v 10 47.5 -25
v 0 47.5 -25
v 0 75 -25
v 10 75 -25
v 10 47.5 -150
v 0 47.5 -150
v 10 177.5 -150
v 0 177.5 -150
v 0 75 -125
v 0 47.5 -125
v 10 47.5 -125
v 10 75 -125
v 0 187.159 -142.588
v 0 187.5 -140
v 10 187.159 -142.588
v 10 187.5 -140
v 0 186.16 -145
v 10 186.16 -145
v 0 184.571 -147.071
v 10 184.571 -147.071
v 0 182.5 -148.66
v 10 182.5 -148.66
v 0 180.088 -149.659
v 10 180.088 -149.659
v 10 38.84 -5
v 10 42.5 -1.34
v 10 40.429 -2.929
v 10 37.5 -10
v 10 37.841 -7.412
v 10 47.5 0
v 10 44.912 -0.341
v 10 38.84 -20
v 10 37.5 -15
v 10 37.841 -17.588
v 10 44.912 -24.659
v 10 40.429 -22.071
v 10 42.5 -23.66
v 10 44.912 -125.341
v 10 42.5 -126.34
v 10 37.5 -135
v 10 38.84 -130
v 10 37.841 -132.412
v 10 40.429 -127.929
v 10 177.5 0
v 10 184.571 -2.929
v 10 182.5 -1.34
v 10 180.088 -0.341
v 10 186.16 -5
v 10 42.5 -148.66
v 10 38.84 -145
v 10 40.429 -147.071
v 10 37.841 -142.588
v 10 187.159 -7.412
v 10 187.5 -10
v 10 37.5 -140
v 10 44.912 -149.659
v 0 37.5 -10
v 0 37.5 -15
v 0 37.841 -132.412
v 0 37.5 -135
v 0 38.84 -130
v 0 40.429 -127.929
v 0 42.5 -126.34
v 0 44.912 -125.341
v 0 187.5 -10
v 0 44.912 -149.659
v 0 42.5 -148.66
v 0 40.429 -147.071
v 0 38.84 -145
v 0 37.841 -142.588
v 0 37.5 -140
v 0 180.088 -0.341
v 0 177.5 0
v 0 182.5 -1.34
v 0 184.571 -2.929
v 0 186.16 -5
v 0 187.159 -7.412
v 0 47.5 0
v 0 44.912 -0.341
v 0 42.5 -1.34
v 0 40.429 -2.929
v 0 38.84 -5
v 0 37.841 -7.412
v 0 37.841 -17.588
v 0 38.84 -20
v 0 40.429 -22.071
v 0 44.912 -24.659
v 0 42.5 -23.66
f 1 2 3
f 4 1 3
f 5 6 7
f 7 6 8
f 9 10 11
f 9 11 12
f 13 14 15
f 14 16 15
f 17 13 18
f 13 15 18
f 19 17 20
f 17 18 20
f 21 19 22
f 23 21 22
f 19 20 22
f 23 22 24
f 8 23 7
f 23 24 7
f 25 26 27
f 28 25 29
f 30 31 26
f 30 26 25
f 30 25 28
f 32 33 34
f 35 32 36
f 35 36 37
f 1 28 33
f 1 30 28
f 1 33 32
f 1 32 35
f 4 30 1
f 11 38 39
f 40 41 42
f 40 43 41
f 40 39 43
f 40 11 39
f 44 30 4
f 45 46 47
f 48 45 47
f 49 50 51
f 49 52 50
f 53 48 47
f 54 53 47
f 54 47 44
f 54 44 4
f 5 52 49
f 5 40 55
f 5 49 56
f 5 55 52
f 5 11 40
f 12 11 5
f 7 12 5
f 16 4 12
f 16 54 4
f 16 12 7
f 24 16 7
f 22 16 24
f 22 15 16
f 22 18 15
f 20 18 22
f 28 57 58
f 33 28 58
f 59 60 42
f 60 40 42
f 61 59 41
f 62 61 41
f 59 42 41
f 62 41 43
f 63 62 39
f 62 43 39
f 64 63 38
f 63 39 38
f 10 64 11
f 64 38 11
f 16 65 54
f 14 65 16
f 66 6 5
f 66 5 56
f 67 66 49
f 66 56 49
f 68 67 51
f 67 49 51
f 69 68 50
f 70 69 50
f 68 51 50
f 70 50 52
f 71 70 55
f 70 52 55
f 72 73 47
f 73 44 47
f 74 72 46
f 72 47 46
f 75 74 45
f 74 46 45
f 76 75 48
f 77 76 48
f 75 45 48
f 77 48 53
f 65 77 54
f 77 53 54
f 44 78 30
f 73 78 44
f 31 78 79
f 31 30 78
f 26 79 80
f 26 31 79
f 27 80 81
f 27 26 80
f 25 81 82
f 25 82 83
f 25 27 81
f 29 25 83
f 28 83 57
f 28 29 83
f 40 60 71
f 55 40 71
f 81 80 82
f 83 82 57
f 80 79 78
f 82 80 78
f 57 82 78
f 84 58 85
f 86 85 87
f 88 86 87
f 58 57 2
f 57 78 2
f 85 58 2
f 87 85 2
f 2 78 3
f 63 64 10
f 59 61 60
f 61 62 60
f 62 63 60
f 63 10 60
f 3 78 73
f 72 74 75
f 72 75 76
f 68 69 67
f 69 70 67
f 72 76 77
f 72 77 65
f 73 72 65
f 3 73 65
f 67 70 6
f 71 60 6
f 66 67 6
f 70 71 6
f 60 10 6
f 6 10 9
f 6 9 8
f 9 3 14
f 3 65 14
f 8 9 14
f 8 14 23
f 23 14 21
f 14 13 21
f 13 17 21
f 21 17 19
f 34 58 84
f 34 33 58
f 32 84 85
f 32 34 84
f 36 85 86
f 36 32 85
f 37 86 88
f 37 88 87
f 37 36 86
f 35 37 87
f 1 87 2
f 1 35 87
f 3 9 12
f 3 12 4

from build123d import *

# Parameters (mm, degrees)
SKETCH10_W          = 150
SKETCH10_H          = 150
BOSS_EXTRUDE3_DEPTH = 10
SKETCH12_W          = 100
SKETCH12_H          = 37.5
CUT_EXTRUDE2_DEPTH  = 10
FILLET7_R           = 10


with BuildPart() as part:
    # Sketch10 → Boss-Extrude3 (new body)
    with BuildSketch(Plane(origin=(0, 0, 0), x_dir=(0, 0, -1), z_dir=(1, 0, 0))):
        with Locations((75, 112.5)):
            Rectangle(SKETCH10_W, SKETCH10_H)
    extrude(amount=BOSS_EXTRUDE3_DEPTH)

    # Sketch12 → Cut-Extrude2 (cut)
    with BuildSketch(Plane.ZY):
        with Locations((-75, 56.25)):
            Rectangle(SKETCH12_W, SKETCH12_H)
    extrude(amount=-CUT_EXTRUDE2_DEPTH, mode=Mode.SUBTRACT)

    # Fillet7
    fillet7_edges = [part.edges().sort_by_distance(p)[0] for p in [
        (5, 37.5, -125),
        (5, 37.5, -25),
        (5, 187.5, 0),
        (5, 187.5, -150),
        (5, 37.5, -150),
        (5, 37.5, 0),
    ]]
    fillet(fillet7_edges, radius=FILLET7_R)


solid = part.part
